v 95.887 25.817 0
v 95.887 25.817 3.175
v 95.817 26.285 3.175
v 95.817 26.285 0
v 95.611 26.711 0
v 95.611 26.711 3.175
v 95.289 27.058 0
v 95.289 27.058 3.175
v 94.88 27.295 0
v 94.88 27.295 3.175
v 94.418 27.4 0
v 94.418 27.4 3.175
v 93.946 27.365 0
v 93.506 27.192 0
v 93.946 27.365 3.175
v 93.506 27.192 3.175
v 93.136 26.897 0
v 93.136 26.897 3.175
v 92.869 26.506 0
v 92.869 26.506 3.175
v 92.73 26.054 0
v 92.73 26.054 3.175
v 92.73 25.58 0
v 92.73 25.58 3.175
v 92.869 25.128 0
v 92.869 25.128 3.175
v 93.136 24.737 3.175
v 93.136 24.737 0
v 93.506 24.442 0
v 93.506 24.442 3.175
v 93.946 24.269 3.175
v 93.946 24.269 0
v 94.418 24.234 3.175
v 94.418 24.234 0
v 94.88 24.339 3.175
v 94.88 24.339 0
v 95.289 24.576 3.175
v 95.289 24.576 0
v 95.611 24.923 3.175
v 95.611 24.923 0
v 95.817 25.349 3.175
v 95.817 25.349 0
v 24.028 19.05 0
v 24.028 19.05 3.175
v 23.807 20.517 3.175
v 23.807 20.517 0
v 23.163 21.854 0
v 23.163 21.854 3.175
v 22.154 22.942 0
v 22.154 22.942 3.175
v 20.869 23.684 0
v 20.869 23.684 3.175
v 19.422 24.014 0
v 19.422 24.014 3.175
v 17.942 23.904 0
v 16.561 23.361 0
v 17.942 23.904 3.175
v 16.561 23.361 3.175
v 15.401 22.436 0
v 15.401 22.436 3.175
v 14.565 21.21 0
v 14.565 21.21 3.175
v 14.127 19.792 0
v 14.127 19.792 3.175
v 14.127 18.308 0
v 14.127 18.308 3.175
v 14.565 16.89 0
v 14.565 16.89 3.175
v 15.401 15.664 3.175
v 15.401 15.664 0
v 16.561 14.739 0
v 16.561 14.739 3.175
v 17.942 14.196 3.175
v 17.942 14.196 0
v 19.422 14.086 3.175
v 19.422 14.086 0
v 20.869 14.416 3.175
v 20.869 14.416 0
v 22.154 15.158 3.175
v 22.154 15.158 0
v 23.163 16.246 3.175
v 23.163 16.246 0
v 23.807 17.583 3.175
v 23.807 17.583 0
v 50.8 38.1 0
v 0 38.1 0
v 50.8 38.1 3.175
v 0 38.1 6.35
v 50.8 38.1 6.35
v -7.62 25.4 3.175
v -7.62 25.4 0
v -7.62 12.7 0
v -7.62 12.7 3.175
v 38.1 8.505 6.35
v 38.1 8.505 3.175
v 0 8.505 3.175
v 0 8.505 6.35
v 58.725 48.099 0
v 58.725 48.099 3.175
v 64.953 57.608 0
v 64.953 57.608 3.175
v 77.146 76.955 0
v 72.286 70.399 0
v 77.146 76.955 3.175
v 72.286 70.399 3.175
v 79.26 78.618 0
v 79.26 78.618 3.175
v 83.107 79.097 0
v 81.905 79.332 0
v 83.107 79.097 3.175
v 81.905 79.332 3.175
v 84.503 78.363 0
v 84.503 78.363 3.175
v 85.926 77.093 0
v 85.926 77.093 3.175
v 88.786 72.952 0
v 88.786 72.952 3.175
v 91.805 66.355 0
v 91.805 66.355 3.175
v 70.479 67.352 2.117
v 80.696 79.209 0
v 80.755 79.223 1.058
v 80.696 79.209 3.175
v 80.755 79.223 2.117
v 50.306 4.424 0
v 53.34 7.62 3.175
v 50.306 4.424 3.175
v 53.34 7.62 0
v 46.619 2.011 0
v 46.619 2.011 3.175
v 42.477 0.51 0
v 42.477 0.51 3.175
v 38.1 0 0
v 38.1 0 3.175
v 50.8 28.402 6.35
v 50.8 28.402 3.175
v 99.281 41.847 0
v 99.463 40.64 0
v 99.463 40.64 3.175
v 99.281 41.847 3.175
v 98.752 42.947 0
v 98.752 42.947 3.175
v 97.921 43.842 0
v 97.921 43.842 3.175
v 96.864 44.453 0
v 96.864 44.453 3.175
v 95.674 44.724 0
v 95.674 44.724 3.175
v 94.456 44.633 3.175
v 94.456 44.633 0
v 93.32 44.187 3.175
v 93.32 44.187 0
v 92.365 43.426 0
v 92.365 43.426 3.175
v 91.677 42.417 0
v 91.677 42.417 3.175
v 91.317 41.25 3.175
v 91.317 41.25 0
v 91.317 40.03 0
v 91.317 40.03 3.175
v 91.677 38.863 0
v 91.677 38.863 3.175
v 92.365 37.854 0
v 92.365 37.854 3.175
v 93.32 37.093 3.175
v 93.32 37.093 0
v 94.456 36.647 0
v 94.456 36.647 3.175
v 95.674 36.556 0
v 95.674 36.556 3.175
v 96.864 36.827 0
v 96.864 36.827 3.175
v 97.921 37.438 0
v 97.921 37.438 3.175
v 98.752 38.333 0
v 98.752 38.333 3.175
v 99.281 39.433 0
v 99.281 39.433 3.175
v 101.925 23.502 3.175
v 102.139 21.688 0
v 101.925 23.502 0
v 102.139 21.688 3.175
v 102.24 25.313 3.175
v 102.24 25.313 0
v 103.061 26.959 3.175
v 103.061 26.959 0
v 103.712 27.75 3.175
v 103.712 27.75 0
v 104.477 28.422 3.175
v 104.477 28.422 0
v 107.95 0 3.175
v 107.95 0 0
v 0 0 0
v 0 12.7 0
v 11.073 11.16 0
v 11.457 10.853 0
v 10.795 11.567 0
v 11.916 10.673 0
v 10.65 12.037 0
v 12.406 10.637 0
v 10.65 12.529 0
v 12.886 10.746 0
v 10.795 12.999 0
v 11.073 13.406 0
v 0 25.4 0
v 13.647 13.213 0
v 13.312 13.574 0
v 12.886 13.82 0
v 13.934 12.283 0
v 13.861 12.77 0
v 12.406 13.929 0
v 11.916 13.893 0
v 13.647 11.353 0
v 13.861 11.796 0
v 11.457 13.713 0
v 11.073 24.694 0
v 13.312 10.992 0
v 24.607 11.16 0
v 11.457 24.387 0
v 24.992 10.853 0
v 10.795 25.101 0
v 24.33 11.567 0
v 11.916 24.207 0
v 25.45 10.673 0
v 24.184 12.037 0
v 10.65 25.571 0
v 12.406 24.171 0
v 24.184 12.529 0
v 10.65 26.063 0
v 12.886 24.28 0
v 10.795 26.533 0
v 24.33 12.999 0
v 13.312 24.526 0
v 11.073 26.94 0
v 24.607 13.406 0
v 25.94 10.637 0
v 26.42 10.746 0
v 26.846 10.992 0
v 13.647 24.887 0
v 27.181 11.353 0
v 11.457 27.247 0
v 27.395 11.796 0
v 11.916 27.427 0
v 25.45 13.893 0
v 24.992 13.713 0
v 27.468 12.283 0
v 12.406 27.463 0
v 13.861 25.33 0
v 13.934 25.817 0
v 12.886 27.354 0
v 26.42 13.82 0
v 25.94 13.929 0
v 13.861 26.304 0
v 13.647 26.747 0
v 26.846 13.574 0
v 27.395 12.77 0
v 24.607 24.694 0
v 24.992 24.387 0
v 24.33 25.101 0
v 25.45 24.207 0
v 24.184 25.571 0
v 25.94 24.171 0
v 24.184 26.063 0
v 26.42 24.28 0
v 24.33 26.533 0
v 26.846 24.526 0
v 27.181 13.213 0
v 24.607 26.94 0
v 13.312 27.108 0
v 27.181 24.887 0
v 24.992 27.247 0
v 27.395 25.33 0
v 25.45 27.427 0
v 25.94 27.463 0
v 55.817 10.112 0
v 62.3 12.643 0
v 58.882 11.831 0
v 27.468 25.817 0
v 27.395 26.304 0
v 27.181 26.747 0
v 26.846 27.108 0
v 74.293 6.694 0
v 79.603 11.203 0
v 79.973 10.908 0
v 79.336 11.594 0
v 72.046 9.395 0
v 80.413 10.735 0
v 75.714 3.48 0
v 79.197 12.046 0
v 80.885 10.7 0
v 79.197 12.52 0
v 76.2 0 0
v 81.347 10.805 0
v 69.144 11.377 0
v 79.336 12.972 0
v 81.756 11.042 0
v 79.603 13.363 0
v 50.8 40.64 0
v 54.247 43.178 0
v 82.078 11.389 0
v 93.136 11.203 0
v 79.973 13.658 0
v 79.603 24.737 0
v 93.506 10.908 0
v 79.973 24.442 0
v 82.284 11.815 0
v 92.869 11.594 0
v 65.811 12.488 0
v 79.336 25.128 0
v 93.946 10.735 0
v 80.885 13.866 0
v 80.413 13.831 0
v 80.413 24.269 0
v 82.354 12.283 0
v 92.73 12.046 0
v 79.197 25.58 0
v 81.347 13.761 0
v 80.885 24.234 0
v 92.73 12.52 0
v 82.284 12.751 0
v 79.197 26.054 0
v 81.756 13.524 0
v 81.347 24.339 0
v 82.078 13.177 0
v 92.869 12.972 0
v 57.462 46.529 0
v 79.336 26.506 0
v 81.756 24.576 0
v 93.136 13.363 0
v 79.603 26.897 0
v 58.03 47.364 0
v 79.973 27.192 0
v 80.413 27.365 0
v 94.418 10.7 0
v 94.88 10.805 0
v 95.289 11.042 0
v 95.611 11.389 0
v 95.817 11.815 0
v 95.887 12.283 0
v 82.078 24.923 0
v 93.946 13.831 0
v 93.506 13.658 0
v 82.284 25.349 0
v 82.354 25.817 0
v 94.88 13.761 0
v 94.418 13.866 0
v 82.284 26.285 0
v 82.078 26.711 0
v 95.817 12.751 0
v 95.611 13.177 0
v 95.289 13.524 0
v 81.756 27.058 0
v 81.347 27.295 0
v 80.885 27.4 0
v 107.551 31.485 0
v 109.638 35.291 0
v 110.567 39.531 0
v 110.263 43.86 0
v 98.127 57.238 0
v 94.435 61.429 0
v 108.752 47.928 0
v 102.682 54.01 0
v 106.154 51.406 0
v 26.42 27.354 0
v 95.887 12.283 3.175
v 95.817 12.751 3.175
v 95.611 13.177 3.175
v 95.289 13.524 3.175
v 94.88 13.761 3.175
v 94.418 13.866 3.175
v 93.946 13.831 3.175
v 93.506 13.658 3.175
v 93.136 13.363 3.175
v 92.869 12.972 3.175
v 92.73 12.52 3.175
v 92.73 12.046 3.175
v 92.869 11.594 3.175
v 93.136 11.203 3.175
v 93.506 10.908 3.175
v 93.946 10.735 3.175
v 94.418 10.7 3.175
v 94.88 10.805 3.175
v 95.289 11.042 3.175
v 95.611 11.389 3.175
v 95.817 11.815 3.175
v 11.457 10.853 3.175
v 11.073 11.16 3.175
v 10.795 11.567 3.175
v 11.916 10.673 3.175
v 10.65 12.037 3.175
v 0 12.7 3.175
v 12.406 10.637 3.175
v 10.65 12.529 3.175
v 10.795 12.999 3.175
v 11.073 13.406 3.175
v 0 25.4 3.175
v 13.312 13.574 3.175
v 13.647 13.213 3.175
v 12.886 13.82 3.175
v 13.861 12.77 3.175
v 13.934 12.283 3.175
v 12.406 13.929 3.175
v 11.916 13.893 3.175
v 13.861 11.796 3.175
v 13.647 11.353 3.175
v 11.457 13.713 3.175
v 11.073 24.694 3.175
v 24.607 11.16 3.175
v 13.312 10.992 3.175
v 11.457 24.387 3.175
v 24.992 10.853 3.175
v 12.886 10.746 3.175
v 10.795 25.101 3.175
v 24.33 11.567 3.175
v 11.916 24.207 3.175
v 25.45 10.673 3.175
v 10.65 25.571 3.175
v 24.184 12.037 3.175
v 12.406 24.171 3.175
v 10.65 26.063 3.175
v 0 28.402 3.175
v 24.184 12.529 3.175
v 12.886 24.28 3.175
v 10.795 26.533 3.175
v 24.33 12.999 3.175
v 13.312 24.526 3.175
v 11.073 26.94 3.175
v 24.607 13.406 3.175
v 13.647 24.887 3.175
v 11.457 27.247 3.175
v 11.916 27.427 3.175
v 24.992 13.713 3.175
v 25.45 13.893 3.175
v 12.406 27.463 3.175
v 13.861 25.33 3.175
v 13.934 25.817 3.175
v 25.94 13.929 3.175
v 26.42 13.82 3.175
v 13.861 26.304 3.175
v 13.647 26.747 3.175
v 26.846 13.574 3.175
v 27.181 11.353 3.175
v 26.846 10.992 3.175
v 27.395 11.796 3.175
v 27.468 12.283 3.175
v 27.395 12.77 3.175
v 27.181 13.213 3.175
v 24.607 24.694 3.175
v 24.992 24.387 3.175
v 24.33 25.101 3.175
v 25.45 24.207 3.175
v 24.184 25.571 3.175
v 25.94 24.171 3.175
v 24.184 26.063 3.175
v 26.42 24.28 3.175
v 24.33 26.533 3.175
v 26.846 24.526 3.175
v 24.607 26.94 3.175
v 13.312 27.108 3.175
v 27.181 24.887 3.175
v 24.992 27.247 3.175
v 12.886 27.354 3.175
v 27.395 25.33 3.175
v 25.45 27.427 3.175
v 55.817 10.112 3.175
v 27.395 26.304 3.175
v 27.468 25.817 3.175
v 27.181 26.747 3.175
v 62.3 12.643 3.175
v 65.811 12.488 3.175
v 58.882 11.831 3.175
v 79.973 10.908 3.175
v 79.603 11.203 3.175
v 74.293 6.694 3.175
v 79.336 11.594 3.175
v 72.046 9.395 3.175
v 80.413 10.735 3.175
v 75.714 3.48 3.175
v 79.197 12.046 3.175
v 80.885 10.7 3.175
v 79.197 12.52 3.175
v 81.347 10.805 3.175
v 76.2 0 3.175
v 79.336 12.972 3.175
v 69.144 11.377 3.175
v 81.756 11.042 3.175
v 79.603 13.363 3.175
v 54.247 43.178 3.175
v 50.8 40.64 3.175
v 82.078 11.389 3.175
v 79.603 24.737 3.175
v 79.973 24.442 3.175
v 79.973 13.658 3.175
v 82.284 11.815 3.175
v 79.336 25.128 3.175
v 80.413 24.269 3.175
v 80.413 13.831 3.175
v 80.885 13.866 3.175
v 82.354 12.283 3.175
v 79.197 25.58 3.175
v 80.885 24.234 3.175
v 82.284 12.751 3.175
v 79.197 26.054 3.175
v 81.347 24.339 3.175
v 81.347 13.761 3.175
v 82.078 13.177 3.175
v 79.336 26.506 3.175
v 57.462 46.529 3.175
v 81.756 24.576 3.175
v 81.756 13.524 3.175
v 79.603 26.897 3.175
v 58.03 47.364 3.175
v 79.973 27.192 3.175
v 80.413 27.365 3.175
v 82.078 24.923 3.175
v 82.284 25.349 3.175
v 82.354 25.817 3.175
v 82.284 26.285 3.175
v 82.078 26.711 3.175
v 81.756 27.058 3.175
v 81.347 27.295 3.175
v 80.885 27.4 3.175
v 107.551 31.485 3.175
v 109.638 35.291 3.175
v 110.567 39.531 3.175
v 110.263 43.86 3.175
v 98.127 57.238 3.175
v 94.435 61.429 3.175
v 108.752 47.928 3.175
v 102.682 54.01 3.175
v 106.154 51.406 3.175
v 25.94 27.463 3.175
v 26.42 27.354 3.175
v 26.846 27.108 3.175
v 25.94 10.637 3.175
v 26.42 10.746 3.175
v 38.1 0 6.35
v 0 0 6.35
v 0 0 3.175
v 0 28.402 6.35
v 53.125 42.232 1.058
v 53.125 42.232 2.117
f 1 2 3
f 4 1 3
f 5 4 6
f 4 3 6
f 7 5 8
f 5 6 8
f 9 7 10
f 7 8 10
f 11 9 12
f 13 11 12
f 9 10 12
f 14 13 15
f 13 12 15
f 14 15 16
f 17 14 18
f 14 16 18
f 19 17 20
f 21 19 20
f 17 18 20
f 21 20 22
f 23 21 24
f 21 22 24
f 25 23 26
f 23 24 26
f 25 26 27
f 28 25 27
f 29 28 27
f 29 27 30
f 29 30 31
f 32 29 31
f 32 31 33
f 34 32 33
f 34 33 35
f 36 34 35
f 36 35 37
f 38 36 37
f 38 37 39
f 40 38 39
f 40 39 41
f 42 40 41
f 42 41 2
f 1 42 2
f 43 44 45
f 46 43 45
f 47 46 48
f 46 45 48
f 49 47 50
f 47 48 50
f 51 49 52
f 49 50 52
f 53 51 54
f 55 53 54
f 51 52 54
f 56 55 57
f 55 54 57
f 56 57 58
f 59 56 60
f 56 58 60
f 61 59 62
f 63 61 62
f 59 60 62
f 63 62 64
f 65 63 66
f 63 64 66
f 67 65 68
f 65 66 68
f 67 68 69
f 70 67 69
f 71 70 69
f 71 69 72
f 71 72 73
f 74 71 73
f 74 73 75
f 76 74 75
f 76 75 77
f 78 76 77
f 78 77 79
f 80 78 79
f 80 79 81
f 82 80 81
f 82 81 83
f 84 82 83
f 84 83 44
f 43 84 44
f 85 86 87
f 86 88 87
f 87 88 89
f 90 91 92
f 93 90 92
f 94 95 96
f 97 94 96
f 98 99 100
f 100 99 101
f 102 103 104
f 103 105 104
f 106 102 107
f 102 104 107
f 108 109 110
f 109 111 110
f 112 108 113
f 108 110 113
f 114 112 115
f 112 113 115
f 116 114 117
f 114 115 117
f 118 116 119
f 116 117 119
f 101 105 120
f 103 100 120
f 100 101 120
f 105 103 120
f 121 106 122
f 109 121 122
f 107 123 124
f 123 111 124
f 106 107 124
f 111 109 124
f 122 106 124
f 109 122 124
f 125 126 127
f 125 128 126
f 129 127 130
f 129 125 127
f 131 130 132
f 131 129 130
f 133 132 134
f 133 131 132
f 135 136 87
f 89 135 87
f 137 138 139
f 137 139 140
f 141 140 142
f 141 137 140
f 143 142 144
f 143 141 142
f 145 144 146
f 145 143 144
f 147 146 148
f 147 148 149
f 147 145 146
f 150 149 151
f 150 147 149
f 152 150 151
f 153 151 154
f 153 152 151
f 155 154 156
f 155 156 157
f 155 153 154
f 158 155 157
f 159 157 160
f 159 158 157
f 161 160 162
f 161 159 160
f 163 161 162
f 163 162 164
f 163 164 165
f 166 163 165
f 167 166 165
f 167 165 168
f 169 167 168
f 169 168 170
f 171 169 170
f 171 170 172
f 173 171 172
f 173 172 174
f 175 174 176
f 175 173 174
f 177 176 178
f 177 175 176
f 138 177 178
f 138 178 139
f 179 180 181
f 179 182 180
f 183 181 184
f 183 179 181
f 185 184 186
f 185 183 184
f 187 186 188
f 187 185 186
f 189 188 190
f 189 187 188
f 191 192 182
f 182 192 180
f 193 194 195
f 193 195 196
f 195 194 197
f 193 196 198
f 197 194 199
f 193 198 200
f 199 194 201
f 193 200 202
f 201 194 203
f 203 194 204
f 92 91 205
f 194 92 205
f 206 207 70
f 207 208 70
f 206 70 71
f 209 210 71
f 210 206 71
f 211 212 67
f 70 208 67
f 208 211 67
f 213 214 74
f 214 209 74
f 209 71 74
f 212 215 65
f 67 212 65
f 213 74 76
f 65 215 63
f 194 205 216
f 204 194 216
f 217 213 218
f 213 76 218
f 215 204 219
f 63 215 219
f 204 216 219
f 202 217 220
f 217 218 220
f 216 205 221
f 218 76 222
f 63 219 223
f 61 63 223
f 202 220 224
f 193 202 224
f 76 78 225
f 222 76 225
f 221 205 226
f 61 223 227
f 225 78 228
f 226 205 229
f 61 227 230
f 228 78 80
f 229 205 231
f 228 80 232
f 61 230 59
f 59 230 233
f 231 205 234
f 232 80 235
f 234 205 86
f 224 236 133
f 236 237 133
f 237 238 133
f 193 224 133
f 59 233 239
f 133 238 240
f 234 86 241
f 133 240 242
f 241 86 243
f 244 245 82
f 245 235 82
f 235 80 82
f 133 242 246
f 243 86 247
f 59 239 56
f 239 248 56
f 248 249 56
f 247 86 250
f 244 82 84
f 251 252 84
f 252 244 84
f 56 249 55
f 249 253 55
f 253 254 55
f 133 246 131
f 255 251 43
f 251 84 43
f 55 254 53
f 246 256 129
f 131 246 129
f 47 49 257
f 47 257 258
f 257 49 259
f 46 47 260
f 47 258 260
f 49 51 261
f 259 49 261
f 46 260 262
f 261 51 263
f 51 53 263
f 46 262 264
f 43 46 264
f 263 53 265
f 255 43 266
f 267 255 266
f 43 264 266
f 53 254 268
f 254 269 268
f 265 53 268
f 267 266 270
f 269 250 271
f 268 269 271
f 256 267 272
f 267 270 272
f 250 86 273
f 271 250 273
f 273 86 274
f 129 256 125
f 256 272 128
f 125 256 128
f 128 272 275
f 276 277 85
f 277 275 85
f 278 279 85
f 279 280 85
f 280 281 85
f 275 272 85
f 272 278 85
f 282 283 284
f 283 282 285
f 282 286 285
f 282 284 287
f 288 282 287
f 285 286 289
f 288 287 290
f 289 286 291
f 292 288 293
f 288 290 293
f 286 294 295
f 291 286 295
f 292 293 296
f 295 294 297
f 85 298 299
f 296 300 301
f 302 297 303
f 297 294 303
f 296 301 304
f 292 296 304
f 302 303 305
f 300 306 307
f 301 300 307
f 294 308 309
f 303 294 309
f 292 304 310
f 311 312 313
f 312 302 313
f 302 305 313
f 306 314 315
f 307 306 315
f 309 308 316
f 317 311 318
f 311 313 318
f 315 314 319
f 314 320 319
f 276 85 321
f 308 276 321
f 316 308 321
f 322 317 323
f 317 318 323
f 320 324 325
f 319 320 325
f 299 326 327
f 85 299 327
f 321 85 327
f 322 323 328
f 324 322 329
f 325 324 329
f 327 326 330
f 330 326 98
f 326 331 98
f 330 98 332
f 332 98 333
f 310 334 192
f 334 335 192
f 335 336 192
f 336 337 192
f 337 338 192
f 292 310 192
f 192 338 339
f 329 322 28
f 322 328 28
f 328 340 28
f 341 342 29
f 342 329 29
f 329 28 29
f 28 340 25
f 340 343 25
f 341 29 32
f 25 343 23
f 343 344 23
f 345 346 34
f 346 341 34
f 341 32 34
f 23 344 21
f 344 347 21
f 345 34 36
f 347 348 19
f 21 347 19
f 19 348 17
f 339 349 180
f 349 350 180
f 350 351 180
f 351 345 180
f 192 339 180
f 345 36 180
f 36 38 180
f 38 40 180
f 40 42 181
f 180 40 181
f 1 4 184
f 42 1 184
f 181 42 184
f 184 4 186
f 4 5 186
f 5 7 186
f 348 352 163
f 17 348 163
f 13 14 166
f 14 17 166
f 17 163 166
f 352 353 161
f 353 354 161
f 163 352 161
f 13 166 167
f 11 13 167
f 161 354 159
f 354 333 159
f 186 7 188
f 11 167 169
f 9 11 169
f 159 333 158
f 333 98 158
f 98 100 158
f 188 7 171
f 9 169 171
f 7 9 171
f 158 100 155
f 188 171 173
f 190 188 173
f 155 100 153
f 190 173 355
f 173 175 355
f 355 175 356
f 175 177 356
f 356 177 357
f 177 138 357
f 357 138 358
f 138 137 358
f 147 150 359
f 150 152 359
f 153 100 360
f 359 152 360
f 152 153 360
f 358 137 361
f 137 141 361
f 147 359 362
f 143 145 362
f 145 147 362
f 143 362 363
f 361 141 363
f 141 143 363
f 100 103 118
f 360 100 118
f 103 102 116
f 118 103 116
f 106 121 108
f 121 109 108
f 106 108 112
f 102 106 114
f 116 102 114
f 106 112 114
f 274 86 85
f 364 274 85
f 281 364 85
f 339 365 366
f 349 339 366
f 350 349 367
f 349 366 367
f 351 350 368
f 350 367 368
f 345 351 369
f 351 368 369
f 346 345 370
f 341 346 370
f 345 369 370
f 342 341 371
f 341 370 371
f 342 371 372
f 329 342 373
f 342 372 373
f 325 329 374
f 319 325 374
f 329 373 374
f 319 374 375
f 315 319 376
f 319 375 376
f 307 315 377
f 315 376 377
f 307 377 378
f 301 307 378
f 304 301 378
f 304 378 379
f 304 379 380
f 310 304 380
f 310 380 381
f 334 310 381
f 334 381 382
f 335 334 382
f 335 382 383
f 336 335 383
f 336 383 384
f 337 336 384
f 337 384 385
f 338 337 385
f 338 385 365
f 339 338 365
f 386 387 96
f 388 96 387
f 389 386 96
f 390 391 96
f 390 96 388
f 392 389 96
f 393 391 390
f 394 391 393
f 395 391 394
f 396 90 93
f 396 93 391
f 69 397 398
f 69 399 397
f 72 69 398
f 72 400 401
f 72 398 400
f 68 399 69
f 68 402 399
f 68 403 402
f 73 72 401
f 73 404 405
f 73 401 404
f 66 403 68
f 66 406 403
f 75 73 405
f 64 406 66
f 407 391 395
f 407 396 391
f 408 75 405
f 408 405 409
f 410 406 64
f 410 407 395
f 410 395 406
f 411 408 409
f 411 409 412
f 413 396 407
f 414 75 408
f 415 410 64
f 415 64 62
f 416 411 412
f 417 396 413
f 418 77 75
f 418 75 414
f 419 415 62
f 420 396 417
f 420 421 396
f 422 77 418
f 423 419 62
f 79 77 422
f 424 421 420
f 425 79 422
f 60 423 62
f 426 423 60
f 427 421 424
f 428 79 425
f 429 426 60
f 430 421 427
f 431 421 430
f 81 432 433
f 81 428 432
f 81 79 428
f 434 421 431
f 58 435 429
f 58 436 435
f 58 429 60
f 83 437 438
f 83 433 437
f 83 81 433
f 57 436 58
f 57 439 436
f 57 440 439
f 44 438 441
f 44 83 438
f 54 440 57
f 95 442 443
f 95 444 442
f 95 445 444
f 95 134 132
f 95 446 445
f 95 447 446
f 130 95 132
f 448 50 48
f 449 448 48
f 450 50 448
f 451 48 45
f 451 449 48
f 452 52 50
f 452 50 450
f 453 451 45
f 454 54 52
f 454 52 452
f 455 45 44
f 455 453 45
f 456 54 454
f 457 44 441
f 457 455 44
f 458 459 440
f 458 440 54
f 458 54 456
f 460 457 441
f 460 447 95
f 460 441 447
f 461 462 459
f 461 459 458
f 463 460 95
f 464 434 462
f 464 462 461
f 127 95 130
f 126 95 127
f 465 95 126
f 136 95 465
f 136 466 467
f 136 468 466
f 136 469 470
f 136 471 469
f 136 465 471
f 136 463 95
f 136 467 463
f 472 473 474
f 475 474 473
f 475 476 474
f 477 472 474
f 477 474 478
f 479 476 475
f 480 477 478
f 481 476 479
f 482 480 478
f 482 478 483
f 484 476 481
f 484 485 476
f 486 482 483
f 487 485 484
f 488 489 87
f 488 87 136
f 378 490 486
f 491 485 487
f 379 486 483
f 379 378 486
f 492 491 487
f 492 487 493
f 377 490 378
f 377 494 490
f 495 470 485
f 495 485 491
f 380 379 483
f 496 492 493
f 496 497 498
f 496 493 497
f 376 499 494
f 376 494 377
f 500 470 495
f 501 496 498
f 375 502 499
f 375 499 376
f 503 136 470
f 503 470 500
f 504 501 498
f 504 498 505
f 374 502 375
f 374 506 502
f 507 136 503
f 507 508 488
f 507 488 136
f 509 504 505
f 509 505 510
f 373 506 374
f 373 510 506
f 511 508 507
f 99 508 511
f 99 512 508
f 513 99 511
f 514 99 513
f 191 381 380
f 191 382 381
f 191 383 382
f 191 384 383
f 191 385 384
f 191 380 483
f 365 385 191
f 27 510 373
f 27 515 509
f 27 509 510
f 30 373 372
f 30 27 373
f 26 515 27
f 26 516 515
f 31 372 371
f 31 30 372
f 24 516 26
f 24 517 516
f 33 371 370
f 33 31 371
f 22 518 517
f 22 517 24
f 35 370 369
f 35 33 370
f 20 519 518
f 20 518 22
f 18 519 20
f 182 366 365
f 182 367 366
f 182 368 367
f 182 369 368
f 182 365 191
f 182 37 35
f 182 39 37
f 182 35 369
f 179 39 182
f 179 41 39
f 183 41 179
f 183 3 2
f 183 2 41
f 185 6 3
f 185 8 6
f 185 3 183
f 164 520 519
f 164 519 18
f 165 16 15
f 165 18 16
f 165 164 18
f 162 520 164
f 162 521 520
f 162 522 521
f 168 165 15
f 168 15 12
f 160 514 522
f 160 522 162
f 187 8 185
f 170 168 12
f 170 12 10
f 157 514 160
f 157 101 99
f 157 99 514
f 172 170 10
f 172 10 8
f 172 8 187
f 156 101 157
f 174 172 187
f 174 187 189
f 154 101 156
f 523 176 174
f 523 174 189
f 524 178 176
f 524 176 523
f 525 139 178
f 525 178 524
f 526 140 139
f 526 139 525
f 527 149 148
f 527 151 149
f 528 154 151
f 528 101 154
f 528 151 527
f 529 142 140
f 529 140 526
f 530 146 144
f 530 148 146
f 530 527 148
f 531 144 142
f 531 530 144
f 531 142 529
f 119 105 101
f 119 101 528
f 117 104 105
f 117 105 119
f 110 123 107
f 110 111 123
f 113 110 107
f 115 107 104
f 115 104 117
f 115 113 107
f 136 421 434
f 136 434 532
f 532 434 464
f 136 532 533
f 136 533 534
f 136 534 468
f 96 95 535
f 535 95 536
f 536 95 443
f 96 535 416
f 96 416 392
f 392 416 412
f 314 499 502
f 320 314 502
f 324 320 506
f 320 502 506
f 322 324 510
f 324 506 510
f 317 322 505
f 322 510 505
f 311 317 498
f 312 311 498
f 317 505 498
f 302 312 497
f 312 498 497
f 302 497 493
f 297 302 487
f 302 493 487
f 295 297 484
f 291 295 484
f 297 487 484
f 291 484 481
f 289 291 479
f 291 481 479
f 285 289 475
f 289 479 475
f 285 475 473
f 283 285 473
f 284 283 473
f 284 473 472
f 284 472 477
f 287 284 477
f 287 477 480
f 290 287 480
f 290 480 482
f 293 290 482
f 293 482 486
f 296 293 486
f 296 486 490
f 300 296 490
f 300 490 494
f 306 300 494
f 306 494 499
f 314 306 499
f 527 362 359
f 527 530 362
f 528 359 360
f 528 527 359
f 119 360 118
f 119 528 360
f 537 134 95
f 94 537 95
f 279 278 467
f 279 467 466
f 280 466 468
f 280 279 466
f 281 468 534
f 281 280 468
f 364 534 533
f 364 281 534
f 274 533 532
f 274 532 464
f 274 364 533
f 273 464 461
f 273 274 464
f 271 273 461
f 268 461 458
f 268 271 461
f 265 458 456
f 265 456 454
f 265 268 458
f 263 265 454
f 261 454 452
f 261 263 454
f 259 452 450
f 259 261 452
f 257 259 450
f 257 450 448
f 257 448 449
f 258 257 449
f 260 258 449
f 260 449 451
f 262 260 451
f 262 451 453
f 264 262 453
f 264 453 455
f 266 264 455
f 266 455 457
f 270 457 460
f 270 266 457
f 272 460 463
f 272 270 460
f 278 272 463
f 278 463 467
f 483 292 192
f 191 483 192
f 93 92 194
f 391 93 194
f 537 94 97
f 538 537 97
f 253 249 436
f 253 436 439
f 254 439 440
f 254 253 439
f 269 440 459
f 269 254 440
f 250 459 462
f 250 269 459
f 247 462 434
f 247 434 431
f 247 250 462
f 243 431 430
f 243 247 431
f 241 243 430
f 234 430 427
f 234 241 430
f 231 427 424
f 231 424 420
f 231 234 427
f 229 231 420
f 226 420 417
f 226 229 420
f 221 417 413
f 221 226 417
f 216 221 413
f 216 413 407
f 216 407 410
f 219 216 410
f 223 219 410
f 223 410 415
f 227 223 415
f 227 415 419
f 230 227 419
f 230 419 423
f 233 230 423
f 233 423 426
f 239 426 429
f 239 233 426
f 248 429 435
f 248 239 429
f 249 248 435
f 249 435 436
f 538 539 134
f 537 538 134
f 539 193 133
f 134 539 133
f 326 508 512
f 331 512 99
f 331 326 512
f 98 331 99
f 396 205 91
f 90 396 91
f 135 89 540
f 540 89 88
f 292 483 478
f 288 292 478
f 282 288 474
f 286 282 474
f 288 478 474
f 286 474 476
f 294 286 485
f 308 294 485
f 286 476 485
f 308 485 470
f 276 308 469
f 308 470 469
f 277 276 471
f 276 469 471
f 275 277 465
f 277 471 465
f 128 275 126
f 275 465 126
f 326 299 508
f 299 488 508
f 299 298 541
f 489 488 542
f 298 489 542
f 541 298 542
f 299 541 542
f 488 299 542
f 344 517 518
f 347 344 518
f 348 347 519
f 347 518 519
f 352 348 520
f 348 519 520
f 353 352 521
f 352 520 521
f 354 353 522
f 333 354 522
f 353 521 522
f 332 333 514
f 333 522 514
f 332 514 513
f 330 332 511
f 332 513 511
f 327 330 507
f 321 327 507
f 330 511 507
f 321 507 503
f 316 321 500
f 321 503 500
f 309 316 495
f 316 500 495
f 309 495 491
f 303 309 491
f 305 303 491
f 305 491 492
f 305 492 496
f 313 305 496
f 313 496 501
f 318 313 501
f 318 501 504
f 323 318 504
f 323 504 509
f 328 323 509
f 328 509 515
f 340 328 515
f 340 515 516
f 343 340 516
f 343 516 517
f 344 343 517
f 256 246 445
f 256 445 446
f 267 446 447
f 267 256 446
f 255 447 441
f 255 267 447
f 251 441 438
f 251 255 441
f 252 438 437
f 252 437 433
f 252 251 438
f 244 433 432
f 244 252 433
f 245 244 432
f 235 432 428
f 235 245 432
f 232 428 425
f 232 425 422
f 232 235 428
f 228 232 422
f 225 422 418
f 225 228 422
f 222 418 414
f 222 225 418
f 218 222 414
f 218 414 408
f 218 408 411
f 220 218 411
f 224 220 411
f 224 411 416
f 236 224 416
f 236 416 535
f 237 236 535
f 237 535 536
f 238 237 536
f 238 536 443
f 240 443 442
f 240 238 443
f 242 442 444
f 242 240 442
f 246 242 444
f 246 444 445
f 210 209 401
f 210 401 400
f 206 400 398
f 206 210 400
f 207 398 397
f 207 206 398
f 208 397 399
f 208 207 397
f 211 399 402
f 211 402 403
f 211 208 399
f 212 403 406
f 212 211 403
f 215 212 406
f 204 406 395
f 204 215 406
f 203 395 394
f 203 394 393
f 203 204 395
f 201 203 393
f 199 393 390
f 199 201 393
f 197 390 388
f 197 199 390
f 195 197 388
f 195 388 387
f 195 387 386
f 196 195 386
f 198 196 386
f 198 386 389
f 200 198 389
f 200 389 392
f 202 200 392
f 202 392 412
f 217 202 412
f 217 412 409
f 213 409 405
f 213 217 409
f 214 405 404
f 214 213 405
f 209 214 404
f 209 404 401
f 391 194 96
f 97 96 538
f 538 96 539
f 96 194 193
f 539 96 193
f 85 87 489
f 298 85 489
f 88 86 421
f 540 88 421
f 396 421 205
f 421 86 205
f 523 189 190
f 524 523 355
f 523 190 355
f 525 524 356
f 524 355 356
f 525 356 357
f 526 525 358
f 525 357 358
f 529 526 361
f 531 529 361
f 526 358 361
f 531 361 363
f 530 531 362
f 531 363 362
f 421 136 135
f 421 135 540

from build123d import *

# Parameters (mm, degrees)
SKETCH1_R           = 4.09575
SKETCH1_R_2         = 1.651
BOSS_EXTRUDE1_DEPTH = 3.175
CUT_EXTRUDE2_DEPTH  = 6.35
SKETCH7_R           = 4.9784
SKETCH7_R_2         = 1.5875
CUT_EXTRUDE3_DEPTH  = 124.96234811
FILLET1_R           = 6.35
SKETCH8_W           = 50.8
SKETCH8_H           = 12.7
CUT_EXTRUDE4_DEPTH  = 50.8
CUT_EXTRUDE5_DEPTH  = 19.304
FILLET6_R           = 6.35
FILLET7_R           = 6.35
FILLET8_R           = 19.05
BOSS_EXTRUDE2_DEPTH = 3.175
FILLET9_R           = 24.13
SKETCH13_W          = 50.8
SKETCH13_H          = 9.69768102
SKETCH13_W_2        = 38.1
SKETCH13_H_2        = 8.504610511
BOSS_EXTRUDE3_DEPTH = 6.35


with BuildPart() as part:
    # Sketch1 → Boss-Extrude1 (new body)
    with BuildSketch(Plane.XY):
        with BuildLine():
            Line((0, 0), (107.95, 0))
            Line((107.95, 0), (100.9362606, 26.175631792))
            Line((100.9362606, 26.175631792), (100.868755024, 26.427566033))
            ThreePointArc((100.868755024, 26.427566033), (110.348359368, 43.438223217), (95.367453293, 55.88))
            Line((95.367453293, 55.88), (0, 38.1))
            Line((0, 38.1), (0, 25.4))
            Line((0, 25.4), (-7.62, 25.4))
            Line((-7.62, 25.4), (-7.62, 12.7))
            Line((-7.62, 12.7), (0, 12.7))
            Line((0, 12.7), (0, 0))
        make_face()
        with Locations((95.367453293, 40.64)):
            Circle(SKETCH1_R, mode=Mode.SUBTRACT)
        with Locations((25.817011896, 25.817011896)):
            Circle(SKETCH1_R_2, mode=Mode.SUBTRACT)
        with Locations((25.817011896, 12.282988104)):
            Circle(SKETCH1_R_2, mode=Mode.SUBTRACT)
        with Locations((12.282988104, 12.282988104)):
            Circle(SKETCH1_R_2, mode=Mode.SUBTRACT)
        with Locations((12.282988104, 25.817011896)):
            Circle(SKETCH1_R_2, mode=Mode.SUBTRACT)
    extrude(amount=BOSS_EXTRUDE1_DEPTH)

    # Sketch6 → Cut-Extrude2 (cut)
    with BuildSketch(Plane.XY.offset(3.175)):
        with BuildLine():
            Line((50.8, 0), (76.2, 0))
            ThreePointArc((76.2, 0), (63.5, 12.7), (50.8, 0))
        make_face()
    extrude(amount=-CUT_EXTRUDE2_DEPTH, mode=Mode.SUBTRACT)

    # Sketch7 → Cut-Extrude3 (cut, through all)
    with BuildSketch(Plane.XY.offset(3.175)):
        with Locations((19.05, 19.05)):
            Circle(SKETCH7_R)
        with Locations((80.766582748, 12.282988104)):
            Circle(SKETCH7_R_2)
        with Locations((94.299702748, 12.282988104)):
            Circle(SKETCH7_R_2)
        with Locations((80.766582748, 25.817011896)):
            Circle(SKETCH7_R_2)
        with Locations((94.299702748, 25.817011896)):
            Circle(SKETCH7_R_2)
    extrude(amount=-CUT_EXTRUDE3_DEPTH, mode=Mode.SUBTRACT)

    # Fillet1
    fillet1_edges = [part.edges().sort_by_distance(p)[0] for p in [
        (100.868755024, 26.427566033, 1.5875),
    ]]
    fillet(fillet1_edges, radius=FILLET1_R)

    # Sketch8 → Cut-Extrude4 (cut)
    with BuildSketch(Plane.XY.offset(3.175)):
        with Locations((25.4, 44.45)):
            Rectangle(SKETCH8_W, SKETCH8_H)
    extrude(amount=-CUT_EXTRUDE4_DEPTH, mode=Mode.SUBTRACT)

    # Sketch9 → Cut-Extrude5 (cut)
    with BuildSketch(Plane.XY.offset(3.175)):
        Polygon((50.8, 47.57098794), (50.8, 40.64), (57.15, 40.64), (57.15, 48.754861432), align=None)
    extrude(amount=-CUT_EXTRUDE5_DEPTH, mode=Mode.SUBTRACT)

    # Fillet6
    fillet6_edges = [part.edges().sort_by_distance(p)[0] for p in [
        (57.15, 40.64, 1.5875),
    ]]
    fillet(fillet6_edges, radius=FILLET6_R - 0.0001)  # a hair under: the kernel refuses the full size

    # Fillet7
    fillet7_edges = [part.edges().sort_by_distance(p)[0] for p in [
        (57.15, 48.754861432, 1.5875),
    ]]
    fillet(fillet7_edges, radius=FILLET7_R)

    # Fillet8
    fillet8_edges = [part.edges().sort_by_distance(p)[0] for p in [
        (50.8, 0, 1.5875),
    ]]
    fillet(fillet8_edges, radius=FILLET8_R)

    # Sketch12 → Boss-Extrude2 (add)
    with BuildSketch(Plane.XY.offset(3.175)):
        with BuildLine():
            Line((50.8, 40.64), (85.027112904, 40.64))
            Line((85.027112904, 40.64), (95.367453293, 55.88))
            add(Edge.make_bspline(
                [(50.8, 40.64), (70.777788932, 52.178803671), (78.594281742, 111.543427795), (95.367453293, 55.88)],
                knots=[0, 0, 0, 0, 1, 1, 1, 1], degree=3))
        make_face()
    extrude(amount=-BOSS_EXTRUDE2_DEPTH)

    # Fillet9
    fillet9_edges = [part.edges().sort_by_distance(p)[0] for p in [
        (95.367453293, 55.88, 1.5875),
    ]]
    fillet(fillet9_edges, radius=FILLET9_R)

    # Sketch13 → Boss-Extrude3 (add)
    with BuildSketch(Plane(origin=(0, 0, 0), x_dir=(-1, 0, 0), z_dir=(0, 0, -1))):
        with Locations((-25.4, 33.25115949)):
            Rectangle(SKETCH13_W, SKETCH13_H)
        with Locations((-19.05, 4.252305256)):
            Rectangle(SKETCH13_W_2, SKETCH13_H_2)
    extrude(amount=-BOSS_EXTRUDE3_DEPTH)


solid = part.part
